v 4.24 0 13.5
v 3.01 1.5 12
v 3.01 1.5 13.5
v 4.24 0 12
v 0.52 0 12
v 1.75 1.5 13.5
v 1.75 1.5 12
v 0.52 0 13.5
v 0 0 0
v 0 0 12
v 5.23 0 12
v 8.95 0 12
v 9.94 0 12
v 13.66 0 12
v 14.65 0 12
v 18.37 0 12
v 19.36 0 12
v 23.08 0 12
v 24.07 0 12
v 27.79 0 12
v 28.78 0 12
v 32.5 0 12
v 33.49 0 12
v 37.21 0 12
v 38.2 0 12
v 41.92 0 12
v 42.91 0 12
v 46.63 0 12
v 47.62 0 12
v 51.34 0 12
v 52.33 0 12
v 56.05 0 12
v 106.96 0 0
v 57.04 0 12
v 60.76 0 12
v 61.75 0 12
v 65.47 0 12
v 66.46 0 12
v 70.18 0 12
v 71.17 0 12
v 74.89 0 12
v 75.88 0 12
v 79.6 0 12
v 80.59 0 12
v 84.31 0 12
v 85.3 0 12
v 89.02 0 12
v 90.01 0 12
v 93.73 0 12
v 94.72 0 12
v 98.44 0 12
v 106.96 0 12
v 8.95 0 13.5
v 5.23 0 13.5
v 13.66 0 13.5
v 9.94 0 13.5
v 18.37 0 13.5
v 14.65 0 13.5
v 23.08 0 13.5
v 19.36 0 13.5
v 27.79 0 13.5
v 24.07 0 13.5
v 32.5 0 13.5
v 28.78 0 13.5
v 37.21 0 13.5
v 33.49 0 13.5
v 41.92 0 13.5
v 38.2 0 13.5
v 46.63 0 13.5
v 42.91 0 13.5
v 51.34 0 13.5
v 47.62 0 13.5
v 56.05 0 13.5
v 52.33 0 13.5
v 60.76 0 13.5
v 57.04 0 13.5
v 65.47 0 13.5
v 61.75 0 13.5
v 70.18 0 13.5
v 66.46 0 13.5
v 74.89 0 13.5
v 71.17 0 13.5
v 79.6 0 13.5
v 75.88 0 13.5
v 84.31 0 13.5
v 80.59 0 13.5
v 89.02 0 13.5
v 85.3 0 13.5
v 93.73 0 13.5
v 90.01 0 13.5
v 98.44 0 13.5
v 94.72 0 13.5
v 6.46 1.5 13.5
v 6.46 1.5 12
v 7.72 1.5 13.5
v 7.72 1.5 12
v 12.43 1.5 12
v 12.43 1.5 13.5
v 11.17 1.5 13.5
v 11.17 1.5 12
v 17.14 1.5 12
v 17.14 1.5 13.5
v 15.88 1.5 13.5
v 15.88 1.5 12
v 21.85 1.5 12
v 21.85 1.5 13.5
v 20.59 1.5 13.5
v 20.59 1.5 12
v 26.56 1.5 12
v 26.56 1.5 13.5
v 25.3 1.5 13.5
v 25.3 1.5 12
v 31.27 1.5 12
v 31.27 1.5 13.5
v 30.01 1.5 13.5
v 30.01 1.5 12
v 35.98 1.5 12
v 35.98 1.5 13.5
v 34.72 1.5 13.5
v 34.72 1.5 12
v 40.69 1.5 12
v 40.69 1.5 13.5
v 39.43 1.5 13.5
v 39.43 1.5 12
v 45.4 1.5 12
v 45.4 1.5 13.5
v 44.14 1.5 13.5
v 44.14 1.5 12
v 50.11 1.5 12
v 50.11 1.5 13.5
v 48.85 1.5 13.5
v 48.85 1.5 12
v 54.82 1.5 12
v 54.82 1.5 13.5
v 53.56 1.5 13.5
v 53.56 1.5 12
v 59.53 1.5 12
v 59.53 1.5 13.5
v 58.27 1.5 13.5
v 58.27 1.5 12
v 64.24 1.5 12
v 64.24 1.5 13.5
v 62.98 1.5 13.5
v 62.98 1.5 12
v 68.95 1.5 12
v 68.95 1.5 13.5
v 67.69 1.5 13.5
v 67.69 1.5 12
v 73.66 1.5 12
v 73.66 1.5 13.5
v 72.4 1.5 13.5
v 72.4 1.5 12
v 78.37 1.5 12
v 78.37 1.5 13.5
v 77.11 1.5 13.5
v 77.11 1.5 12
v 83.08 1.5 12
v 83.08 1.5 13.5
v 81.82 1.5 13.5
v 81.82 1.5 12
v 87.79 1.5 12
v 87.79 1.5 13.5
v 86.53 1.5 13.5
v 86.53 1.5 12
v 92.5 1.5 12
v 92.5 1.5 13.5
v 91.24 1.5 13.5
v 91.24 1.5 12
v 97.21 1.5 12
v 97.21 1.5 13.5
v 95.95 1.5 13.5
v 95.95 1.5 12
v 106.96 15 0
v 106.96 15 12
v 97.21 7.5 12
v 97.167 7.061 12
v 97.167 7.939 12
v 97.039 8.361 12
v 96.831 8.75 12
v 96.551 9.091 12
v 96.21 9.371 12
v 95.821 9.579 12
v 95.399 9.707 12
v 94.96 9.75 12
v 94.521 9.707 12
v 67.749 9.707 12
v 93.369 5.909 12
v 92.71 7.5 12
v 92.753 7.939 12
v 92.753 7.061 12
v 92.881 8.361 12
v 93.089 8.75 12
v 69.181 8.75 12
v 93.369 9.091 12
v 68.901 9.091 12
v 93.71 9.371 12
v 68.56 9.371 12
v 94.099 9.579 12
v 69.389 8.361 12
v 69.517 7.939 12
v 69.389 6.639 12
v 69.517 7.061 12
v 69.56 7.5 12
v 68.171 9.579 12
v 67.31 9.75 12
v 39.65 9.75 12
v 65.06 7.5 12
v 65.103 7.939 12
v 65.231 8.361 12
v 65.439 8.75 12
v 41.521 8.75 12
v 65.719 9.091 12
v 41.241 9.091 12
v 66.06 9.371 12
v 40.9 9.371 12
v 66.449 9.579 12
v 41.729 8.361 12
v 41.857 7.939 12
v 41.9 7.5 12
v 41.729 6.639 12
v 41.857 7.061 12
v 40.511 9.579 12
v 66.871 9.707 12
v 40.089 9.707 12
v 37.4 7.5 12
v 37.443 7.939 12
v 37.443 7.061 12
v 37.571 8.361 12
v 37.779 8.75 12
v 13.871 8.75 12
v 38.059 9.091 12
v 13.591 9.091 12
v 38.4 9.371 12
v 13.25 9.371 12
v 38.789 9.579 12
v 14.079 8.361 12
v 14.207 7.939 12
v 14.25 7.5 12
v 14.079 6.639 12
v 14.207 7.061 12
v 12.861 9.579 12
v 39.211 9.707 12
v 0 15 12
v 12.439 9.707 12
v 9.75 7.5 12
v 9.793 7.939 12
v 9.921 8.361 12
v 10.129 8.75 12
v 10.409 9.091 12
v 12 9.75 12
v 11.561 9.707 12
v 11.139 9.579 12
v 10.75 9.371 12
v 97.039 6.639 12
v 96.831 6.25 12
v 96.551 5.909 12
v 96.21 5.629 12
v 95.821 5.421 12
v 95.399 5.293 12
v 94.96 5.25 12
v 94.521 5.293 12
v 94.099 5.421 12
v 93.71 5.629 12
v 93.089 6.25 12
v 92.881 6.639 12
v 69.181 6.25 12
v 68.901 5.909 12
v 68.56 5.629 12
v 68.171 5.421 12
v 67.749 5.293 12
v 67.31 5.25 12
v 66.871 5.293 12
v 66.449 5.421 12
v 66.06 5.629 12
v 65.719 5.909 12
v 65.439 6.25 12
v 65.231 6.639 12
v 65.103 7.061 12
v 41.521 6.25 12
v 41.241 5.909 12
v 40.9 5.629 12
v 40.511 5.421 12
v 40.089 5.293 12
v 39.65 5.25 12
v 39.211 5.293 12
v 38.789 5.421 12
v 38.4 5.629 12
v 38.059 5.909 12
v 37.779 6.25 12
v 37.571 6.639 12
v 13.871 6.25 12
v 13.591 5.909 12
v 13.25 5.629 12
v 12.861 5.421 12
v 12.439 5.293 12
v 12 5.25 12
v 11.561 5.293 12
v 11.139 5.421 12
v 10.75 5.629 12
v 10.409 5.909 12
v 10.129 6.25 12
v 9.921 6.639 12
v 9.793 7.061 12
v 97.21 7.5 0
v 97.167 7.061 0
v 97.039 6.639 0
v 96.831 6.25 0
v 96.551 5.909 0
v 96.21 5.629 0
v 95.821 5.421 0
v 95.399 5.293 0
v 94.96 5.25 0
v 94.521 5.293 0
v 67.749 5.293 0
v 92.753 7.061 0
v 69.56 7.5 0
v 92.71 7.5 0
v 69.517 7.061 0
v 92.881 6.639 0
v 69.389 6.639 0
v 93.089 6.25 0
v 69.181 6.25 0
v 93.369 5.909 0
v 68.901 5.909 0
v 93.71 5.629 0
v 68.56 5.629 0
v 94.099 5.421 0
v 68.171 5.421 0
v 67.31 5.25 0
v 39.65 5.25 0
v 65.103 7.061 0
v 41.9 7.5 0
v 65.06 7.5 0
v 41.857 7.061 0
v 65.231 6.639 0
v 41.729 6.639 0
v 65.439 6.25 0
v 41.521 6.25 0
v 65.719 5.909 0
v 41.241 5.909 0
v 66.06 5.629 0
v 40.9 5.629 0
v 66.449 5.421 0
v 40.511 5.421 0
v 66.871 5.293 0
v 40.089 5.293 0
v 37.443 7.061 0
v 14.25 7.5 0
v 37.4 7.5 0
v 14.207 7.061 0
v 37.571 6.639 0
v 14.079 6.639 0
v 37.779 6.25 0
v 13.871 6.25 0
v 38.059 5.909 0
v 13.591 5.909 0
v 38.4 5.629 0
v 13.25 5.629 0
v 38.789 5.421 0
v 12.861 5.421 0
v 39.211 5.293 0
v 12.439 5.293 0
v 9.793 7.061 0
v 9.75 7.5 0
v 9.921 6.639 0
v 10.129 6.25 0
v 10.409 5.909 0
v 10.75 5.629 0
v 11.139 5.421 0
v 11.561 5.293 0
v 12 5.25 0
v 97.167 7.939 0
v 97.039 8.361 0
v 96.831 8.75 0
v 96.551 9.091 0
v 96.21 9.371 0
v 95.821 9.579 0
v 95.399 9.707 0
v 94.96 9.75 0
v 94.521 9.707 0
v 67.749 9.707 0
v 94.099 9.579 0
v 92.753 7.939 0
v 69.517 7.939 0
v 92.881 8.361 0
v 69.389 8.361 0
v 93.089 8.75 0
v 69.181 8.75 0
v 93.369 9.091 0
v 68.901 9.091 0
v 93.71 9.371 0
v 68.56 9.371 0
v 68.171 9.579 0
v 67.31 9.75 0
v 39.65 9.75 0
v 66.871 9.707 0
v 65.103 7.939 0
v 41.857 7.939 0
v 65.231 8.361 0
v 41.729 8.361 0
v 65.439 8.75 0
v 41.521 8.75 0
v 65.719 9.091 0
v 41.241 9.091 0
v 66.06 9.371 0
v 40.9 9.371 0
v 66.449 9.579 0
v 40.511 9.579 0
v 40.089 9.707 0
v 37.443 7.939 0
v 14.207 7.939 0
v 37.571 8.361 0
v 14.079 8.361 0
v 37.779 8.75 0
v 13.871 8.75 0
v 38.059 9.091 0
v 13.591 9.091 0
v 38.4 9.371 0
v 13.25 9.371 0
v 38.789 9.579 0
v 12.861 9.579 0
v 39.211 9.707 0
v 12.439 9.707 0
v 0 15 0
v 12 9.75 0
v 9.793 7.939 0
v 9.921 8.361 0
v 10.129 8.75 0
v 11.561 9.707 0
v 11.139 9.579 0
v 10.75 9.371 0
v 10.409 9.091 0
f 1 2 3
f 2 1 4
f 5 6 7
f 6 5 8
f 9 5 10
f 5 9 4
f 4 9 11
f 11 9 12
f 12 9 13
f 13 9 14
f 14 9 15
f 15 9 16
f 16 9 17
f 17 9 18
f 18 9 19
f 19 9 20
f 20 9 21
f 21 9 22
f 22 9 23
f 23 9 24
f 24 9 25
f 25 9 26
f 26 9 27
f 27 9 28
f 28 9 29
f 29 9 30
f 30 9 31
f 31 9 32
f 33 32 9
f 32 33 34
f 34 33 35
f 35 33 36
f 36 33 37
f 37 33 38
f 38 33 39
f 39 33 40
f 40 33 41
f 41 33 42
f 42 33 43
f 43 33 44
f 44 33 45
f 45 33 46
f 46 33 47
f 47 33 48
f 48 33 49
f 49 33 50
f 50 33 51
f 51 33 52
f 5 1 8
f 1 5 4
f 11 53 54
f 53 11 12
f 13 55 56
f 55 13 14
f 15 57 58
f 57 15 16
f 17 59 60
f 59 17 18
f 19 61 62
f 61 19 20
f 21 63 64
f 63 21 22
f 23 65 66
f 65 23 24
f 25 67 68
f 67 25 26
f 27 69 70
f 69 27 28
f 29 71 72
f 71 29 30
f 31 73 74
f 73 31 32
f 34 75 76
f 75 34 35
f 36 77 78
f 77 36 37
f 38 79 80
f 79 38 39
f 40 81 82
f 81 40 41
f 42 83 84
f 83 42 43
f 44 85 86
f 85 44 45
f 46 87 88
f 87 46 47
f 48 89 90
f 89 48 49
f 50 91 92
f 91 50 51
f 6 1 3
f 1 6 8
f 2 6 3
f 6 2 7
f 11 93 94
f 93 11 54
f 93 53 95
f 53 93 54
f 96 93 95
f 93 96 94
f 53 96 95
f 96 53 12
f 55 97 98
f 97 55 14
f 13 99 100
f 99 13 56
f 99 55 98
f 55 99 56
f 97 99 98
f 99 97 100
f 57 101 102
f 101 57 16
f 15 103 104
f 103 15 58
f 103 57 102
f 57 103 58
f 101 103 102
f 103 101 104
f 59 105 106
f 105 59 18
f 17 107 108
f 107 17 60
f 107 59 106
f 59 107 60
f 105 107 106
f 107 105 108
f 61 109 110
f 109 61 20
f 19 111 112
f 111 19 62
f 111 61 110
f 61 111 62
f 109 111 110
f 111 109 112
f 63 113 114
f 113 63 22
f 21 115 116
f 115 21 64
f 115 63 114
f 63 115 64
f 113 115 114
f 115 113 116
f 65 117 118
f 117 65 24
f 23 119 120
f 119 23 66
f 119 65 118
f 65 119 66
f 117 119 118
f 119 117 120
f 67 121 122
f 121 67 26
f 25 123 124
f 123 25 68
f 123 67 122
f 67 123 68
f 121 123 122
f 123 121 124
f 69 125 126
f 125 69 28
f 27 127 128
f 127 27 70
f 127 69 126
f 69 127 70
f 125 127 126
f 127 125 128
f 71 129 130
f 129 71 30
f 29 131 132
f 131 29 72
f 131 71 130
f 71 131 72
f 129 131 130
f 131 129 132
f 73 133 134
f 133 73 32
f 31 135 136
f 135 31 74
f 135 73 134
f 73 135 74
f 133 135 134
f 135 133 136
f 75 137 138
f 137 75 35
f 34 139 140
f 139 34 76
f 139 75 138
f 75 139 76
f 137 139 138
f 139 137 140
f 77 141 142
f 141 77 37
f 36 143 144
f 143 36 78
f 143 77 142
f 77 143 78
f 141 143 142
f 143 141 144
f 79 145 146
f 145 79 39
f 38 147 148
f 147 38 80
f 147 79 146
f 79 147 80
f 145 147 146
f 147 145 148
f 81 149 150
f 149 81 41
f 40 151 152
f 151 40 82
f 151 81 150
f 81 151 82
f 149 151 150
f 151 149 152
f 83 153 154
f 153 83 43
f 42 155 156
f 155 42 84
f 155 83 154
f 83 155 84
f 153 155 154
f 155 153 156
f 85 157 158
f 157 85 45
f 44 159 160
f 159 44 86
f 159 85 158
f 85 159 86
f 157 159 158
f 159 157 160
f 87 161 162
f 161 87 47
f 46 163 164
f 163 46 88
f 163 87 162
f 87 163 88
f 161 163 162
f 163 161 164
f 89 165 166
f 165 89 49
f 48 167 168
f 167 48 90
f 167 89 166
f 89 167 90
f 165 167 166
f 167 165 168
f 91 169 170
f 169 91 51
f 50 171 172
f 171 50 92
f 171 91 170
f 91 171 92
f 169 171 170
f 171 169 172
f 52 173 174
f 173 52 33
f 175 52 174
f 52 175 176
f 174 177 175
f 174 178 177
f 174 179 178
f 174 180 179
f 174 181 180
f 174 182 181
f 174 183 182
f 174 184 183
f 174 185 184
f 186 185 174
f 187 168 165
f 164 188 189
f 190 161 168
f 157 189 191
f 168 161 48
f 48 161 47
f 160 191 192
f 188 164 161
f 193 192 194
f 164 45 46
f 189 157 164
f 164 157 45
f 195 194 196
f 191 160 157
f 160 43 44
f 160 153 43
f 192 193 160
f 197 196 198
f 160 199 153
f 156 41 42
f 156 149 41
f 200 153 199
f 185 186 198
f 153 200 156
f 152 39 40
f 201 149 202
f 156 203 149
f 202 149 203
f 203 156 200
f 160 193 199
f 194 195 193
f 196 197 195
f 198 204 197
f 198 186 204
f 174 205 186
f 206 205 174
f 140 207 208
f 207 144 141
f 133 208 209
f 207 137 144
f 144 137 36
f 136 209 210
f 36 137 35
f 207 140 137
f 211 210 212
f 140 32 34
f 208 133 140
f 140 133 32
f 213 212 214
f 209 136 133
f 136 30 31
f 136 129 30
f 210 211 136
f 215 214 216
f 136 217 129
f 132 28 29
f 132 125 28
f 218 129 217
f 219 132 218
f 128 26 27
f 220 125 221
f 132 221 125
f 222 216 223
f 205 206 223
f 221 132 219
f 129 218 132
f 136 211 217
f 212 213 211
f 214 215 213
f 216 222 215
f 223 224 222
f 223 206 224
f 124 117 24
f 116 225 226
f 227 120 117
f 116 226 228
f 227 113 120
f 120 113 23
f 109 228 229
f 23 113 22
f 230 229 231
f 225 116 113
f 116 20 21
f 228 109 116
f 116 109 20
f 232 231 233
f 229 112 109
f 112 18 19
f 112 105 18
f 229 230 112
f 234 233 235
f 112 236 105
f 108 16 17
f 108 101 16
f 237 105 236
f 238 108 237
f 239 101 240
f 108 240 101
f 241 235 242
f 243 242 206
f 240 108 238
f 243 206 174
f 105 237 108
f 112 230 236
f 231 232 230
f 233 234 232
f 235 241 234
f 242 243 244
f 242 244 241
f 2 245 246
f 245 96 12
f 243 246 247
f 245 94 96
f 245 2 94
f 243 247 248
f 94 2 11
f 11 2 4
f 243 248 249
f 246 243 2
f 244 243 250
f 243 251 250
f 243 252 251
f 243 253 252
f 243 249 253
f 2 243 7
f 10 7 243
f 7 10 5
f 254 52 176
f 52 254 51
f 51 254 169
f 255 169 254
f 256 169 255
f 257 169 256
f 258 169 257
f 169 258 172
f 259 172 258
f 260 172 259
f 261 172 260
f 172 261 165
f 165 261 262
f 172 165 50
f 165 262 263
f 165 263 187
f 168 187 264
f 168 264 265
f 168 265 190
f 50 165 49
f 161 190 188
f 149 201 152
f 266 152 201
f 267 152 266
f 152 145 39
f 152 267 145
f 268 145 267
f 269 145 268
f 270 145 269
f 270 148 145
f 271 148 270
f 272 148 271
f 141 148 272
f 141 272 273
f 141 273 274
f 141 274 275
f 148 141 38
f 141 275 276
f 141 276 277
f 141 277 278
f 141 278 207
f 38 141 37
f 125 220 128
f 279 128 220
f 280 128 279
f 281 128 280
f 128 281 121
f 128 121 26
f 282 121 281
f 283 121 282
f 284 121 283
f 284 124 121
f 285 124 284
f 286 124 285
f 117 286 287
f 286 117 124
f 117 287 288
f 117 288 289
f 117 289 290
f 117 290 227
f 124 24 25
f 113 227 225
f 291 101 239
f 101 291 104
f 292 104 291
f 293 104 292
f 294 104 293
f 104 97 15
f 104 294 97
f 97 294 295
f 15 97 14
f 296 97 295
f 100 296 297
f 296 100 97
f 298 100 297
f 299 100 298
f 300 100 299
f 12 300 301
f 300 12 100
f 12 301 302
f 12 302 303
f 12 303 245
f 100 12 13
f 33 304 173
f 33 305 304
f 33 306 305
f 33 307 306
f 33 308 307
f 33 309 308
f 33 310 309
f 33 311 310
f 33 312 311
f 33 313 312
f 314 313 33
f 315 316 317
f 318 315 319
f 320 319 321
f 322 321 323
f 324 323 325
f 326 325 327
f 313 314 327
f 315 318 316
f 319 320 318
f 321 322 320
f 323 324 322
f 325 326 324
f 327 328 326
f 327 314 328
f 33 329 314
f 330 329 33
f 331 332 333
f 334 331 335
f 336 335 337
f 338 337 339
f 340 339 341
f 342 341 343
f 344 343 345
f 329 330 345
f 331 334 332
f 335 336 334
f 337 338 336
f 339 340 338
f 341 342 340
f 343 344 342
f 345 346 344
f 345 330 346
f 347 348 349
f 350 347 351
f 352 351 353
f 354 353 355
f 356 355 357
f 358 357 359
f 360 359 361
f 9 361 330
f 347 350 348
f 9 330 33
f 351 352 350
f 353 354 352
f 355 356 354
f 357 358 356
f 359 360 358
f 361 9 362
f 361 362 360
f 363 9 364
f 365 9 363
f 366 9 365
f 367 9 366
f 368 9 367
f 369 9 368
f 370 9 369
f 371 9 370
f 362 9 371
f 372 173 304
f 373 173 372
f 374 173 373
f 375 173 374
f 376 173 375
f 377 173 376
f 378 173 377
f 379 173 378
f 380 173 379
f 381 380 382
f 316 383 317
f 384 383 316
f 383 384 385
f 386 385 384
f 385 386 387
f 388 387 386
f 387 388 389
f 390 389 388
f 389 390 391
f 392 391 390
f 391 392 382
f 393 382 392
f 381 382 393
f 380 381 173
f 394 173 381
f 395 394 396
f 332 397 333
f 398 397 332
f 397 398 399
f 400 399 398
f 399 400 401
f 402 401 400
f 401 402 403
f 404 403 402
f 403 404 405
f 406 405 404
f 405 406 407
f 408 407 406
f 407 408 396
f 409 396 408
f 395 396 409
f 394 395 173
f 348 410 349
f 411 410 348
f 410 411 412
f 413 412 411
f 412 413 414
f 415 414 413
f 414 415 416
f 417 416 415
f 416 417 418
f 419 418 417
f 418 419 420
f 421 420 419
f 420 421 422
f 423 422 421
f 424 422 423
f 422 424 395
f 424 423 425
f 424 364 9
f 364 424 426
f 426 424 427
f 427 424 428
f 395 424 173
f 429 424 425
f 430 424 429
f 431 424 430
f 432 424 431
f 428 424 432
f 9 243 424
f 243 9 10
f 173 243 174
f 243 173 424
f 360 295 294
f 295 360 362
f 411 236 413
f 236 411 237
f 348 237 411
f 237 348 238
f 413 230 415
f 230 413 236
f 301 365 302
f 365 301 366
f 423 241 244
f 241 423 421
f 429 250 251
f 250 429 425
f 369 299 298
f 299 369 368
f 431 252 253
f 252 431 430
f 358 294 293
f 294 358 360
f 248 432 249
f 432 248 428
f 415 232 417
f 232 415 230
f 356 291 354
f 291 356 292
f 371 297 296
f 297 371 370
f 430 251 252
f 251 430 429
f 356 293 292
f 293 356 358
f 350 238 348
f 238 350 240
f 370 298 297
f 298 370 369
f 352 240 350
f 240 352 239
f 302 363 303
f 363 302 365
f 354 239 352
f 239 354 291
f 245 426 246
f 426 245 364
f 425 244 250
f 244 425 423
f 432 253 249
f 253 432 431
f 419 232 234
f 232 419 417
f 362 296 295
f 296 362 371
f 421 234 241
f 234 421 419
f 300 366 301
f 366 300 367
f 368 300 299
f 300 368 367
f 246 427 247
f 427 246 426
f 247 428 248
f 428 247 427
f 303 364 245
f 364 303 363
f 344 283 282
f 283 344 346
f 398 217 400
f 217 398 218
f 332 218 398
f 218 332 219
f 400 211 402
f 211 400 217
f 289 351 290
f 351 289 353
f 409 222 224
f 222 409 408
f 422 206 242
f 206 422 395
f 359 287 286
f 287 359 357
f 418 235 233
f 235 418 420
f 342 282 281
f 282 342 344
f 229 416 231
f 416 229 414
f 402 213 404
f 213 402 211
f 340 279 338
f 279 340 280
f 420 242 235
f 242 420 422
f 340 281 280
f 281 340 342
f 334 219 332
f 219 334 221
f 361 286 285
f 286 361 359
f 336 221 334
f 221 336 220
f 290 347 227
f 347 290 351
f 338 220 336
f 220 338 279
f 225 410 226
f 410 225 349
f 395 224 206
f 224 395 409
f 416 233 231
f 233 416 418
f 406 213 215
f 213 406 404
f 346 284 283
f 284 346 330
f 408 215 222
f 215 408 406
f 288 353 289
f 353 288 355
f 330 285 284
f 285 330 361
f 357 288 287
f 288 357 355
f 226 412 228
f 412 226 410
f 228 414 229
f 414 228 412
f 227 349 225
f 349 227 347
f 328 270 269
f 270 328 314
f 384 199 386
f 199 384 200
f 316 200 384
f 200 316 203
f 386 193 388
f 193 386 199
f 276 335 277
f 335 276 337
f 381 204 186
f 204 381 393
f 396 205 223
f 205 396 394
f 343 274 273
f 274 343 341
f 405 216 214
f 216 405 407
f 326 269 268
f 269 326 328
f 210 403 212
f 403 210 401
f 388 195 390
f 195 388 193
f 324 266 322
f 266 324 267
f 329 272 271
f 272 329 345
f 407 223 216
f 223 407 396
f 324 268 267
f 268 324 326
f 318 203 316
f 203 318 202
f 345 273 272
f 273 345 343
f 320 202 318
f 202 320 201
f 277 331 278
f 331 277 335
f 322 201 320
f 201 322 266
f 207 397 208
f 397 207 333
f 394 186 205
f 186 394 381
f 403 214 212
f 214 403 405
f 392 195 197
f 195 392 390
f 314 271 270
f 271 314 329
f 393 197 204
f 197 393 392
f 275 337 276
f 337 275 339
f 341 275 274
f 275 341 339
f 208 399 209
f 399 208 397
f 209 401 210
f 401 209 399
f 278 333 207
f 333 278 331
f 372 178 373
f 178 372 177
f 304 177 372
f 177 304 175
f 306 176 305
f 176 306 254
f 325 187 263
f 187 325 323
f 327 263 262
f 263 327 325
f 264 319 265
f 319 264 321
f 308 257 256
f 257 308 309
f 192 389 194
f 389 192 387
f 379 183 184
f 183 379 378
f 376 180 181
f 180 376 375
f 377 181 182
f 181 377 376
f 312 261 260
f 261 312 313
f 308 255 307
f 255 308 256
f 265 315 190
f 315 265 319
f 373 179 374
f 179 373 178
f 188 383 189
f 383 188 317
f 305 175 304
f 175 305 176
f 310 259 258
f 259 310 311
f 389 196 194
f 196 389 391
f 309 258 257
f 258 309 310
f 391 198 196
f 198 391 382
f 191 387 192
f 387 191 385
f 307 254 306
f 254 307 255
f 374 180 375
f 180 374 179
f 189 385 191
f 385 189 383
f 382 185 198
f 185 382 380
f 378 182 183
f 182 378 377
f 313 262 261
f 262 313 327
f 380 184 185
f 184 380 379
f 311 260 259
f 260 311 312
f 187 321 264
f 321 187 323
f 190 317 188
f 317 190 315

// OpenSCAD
$fn = 32;

// ----------------------------------------------------------------------
// Gear rack: m=1.5 z=21, 106.96 x 15 x 13.5 mm
// ----------------------------------------------------------------------

// --- parameters (mm) ---
bar_len = 106.96;         // rack length, X
bar_w = 15;               // rack width, Y
bar_h = 13.5;             // overall height, Z
gear_module = 1.5;        // module
base_t = 12;              // tooth root line height
pitch = 4.71;             // circular pitch
tip_w = 1.26;             // tooth thickness at the tip
root_w = 3.72;            // tooth thickness at the root line
hole_d = 4.5;             // mounting hole
sink = 0.6;               // tooth root overlap into the body

tooth_span = 98.96;

module tooth(x0) {
  /* 20 deg flank profile, sunk into the body for a positive overlap */
  translate([x0, 0, base_t - sink])
    linear_extrude(height = bar_h - base_t + sink)
      polygon(points = [[-root_w / 2, 0], [root_w / 2, 0],
                        [tip_w / 2, bar_h - base_t],
                        [-tip_w / 2, bar_h - base_t]]);
}

difference() {
  union() {
    cube([bar_len, bar_w, base_t]);
    for (i = [0 : 21 - 1])
      tooth((i + 0.5) * pitch + (tooth_span - 21 * pitch) / 2);
  }
  translate([12, 7.5, -1]) cylinder(h = base_t + 2, d = hole_d);
  translate([39.65, 7.5, -1]) cylinder(h = base_t + 2, d = hole_d);
  translate([67.31, 7.5, -1]) cylinder(h = base_t + 2, d = hole_d);
  translate([94.96, 7.5, -1]) cylinder(h = base_t + 2, d = hole_d);
}
